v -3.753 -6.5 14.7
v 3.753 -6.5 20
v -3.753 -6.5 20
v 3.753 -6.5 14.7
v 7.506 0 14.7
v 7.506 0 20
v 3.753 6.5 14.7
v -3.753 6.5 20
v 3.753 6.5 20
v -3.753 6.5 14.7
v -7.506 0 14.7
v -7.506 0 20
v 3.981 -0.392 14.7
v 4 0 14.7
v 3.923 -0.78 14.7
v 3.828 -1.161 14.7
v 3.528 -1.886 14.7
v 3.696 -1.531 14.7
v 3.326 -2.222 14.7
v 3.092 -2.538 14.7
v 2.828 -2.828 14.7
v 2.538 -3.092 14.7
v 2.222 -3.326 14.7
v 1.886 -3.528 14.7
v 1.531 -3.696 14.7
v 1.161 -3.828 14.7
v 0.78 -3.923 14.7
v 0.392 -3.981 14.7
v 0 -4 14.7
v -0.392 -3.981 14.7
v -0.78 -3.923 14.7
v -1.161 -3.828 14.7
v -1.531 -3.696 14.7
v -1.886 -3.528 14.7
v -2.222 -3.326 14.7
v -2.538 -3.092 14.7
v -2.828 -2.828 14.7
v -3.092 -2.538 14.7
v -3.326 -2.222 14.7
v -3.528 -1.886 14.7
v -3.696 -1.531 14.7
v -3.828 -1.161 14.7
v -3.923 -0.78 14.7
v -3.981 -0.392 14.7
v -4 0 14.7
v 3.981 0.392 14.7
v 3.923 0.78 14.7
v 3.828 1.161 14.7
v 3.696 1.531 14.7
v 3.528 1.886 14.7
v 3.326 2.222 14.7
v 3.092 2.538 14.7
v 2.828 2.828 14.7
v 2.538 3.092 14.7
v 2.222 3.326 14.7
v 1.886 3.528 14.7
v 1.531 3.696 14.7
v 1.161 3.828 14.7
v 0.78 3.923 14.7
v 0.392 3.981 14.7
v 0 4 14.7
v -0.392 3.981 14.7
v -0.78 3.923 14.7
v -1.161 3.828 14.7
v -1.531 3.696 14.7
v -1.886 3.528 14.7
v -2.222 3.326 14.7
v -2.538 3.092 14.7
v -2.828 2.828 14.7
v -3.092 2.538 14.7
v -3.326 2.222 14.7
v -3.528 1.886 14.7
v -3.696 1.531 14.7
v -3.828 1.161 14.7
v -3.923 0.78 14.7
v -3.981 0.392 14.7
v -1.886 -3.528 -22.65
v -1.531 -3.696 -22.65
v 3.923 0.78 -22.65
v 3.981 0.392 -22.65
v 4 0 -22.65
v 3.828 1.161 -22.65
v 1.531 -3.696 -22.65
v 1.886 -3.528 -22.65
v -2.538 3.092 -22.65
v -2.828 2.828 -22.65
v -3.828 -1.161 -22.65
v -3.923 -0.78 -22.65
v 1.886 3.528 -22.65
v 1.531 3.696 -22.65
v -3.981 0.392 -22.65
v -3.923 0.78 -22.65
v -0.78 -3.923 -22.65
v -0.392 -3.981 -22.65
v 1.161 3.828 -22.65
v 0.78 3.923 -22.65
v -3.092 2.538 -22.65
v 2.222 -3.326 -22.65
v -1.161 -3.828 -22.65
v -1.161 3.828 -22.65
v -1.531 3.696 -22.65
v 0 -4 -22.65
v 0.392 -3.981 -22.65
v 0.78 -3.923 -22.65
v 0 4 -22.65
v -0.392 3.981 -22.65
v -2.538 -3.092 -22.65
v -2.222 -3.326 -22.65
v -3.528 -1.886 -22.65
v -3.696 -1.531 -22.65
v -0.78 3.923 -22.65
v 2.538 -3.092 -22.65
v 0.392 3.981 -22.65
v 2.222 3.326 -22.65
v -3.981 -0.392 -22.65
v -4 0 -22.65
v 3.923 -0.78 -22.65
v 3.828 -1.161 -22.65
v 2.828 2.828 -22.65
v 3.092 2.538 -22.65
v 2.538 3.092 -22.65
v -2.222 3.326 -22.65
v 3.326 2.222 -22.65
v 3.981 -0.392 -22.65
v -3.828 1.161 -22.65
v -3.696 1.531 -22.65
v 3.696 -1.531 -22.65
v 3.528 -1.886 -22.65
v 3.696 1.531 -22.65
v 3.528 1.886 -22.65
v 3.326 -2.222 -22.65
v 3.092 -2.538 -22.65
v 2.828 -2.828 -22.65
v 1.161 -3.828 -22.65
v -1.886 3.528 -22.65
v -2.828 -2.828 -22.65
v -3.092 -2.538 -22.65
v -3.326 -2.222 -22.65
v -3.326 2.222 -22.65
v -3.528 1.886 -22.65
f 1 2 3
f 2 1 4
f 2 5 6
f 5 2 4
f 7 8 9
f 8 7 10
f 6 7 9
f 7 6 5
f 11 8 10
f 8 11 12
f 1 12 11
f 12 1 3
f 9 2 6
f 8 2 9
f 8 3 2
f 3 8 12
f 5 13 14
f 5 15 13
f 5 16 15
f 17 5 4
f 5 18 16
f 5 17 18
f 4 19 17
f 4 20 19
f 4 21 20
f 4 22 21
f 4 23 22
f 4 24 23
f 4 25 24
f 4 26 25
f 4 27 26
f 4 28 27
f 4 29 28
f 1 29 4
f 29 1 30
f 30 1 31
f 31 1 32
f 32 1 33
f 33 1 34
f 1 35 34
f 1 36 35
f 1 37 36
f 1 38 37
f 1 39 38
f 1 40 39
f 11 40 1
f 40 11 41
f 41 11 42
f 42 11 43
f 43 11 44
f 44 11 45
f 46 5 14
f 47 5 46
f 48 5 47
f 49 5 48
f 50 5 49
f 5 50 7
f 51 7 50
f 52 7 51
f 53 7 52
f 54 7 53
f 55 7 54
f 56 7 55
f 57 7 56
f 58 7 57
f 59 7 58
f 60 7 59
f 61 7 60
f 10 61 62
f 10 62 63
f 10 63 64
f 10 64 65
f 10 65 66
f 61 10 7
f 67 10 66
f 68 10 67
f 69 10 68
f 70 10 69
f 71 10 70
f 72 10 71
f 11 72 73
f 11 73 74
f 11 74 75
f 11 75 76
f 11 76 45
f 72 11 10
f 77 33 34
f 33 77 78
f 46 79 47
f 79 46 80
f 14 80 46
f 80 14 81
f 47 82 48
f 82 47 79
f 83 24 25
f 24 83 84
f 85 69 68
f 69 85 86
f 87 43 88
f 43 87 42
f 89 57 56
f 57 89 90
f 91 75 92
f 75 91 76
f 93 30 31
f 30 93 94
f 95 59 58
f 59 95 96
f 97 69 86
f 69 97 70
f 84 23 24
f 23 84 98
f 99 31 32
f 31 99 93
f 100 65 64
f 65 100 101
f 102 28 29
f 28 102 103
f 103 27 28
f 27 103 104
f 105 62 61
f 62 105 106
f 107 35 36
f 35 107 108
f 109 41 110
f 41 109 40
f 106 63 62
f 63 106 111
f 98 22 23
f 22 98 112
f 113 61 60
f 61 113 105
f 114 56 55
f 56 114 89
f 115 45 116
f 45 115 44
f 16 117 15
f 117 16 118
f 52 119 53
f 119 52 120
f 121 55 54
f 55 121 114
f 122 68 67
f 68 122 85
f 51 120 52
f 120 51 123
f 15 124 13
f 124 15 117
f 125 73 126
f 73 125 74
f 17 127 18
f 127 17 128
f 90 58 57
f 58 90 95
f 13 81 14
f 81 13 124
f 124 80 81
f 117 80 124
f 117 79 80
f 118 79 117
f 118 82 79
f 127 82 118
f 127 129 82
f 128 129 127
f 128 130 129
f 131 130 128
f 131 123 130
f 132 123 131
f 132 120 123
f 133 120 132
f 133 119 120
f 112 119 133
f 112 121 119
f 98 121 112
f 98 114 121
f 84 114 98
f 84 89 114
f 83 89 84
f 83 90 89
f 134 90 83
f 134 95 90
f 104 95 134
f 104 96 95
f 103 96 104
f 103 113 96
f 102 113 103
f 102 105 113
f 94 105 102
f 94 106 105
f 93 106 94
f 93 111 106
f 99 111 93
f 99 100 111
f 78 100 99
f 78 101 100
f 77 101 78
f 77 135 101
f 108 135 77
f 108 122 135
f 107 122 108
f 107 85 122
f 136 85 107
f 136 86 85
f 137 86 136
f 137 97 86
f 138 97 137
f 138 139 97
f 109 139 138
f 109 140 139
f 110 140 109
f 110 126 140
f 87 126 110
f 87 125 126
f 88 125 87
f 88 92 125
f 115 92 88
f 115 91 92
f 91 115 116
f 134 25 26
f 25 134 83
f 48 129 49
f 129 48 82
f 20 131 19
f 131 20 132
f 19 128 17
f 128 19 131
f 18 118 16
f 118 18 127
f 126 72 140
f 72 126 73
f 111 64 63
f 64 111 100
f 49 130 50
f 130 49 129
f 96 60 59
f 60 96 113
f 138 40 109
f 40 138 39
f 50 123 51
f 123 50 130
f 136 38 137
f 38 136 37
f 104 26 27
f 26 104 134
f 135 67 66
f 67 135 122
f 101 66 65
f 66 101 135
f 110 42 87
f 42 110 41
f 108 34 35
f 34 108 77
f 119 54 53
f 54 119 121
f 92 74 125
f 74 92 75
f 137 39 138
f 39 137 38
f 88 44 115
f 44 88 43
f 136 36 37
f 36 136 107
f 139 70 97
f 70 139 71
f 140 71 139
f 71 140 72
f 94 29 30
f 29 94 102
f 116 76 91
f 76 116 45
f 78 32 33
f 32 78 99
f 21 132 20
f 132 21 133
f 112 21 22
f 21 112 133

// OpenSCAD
p0_length = 40.0;
p0_head_across_flats = 13.0;
p0_head_height = 5.3;
p0_shank_diameter = 8.0;
p1_outer_diameter = 16.0;
p1_inner_diameter = 8.4;
p1_thickness = 1.6;
p2_across_flats = 13.0;
p2_thickness = 6.5;
p2_hole_diameter = 8.4;

module part_0() {
  union() {
    translate([0,0,((p0_length) - (p0_head_height)) / 2.0]) cylinder(h=p0_head_height, r=(p0_head_across_flats) / 1.7320508075688772, center=true, $fn=6);
    translate([0,0,-(p0_head_height) / 2.0]) cylinder(h=p0_length, r=(p0_shank_diameter) / 2.0, center=true, $fn=64);
  }
}

module part_1() {
  difference() {
    cylinder(h=p1_thickness, r=(p1_outer_diameter) / 2.0, center=true, $fn=96);
    cylinder(h=(p1_thickness) + 0.2, r=(p1_inner_diameter) / 2.0, center=true, $fn=64);
  }
}

module part_2() {
  difference() {
    cylinder(h=p2_thickness, r=(p2_across_flats) / 1.7320508075688772, center=true, $fn=6);
    cylinder(h=(p2_thickness) + 0.2, r=(p2_hole_diameter) / 2.0, center=true, $fn=64);
  }
}

translate([0.0, 0.0, 0.0])
rotate([0.0, 0.0, 0.0]) {
  part_0();
}
